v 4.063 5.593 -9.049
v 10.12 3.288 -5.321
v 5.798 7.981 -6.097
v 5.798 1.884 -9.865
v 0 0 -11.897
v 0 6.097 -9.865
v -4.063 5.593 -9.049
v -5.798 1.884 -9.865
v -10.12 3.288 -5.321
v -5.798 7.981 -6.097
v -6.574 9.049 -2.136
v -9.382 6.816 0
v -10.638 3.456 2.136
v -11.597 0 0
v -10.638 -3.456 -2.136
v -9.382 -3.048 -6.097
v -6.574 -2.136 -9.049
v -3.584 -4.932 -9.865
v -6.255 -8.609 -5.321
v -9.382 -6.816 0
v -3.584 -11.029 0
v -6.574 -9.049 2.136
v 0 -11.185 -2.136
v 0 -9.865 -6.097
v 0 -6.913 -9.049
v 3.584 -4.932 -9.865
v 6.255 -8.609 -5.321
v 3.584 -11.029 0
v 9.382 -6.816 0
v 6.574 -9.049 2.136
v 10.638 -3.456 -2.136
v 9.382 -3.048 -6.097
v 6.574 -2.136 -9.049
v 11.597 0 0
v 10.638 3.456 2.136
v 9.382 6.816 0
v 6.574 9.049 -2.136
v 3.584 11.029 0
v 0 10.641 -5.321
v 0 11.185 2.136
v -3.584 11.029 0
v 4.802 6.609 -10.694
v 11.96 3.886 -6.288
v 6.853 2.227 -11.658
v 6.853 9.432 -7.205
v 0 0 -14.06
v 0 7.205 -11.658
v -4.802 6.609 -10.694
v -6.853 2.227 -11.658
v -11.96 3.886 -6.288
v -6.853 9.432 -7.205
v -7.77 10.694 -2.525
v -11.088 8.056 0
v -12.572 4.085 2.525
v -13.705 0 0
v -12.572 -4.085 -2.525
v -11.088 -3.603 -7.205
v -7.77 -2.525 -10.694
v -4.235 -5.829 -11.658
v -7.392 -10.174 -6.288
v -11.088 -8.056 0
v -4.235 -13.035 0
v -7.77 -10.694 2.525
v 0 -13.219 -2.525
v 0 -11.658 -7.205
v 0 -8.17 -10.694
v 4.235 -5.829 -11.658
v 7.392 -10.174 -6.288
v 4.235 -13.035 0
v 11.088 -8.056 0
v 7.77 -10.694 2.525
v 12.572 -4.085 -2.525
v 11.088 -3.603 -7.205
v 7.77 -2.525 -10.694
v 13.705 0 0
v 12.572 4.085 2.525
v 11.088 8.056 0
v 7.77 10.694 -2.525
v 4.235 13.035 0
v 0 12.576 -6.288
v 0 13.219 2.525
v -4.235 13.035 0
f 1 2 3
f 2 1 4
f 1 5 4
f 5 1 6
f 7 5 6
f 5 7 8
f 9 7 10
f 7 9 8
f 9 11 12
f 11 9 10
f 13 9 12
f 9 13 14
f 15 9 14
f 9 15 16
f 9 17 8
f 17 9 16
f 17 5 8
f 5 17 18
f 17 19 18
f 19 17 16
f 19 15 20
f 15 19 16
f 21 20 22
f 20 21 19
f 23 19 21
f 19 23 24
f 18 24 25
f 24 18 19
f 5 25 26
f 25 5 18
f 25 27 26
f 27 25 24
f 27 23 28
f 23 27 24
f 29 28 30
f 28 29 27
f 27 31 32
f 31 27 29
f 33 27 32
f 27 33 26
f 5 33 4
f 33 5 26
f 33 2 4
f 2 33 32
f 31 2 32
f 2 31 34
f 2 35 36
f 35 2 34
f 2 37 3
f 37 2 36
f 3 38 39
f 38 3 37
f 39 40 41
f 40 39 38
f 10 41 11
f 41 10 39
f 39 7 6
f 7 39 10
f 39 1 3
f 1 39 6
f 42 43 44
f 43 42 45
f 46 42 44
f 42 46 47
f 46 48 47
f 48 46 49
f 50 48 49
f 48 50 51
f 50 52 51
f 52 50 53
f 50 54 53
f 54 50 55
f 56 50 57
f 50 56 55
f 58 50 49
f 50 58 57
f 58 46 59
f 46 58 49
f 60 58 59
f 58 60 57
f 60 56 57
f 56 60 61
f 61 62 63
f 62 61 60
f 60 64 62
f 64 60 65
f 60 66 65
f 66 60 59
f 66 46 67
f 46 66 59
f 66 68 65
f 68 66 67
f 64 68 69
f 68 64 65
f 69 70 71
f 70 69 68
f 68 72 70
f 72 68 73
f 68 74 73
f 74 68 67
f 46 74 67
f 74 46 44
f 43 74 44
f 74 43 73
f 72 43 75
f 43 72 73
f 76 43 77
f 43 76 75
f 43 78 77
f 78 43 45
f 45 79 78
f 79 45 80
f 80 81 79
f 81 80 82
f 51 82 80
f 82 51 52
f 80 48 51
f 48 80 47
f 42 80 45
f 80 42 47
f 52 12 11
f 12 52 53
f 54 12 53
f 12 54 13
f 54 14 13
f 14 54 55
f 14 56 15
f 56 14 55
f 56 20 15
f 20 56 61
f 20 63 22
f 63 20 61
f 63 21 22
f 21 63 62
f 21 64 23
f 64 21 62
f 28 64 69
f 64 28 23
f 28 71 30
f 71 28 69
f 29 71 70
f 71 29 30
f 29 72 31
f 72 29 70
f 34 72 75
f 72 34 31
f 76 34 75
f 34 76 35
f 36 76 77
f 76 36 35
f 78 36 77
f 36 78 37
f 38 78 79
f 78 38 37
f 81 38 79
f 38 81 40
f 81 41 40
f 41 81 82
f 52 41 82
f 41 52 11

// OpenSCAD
module eggshell25mm() {

	rotate ([0,0,18])
		polyhedron( points = [ [5.592530e+00, 4.063211e+00, -9.048904e+00], [7.980826e+00, 5.798409e+00, -6.096808e+00], [1.064110e+01, -0.000000e+00, -5.320550e+00], [6.096808e+00, 0.000000e+00, -9.864843e+00], [-8.881784e-16, 0.000000e+00, -1.189711e+01], [1.884017e+00, 5.798409e+00, -9.864843e+00], [-2.136156e+00, 6.574413e+00, -9.048904e+00], [-4.932421e+00, 3.583614e+00, -9.864843e+00], [-8.608831e+00, 6.254682e+00, -5.320550e+00], [-3.048404e+00, 9.382023e+00, -6.096808e+00], [-3.456374e+00, 1.063762e+01, -2.136156e+00], [-6.816439e+00, 9.382023e+00, -0.000000e+00], [-9.048904e+00, 6.574413e+00, 2.136156e+00], [-1.102923e+01, 3.583614e+00, 8.881784e-16], [-1.118506e+01, 0.000000e+00, -2.136156e+00], [-9.864843e+00, 0.000000e+00, -6.096808e+00], [-6.912747e+00, 0.000000e+00, -9.048904e+00], [-4.932421e+00, -3.583614e+00, -9.864843e+00], [-8.608831e+00, -6.254682e+00, -5.320550e+00], [-1.102923e+01, -3.583614e+00, 8.881784e-16], [-9.048904e+00, -6.574413e+00, 2.136156e+00], [-6.816439e+00, -9.382023e+00, -0.000000e+00], [-3.456374e+00, -1.063762e+01, -2.136156e+00], [-3.048404e+00, -9.382023e+00, -6.096808e+00], [-2.136156e+00, -6.574413e+00, -9.048904e+00], [1.884017e+00, -5.798409e+00, -9.864843e+00], [3.288281e+00, -1.012029e+01, -5.320550e+00], [0.000000e+00, -1.159682e+01, -0.000000e+00], [3.456374e+00, -1.063762e+01, 2.136156e+00], [6.816439e+00, -9.382023e+00, -0.000000e+00], [9.048904e+00, -6.574413e+00, -2.136156e+00], [7.980826e+00, -5.798409e+00, -6.096808e+00], [5.592530e+00, -4.063211e+00, -9.048904e+00], [1.102923e+01, -3.583614e+00, -8.881784e-16], [1.118506e+01, -0.000000e+00, 2.136156e+00], [1.102923e+01, 3.583614e+00, -8.881784e-16], [9.048904e+00, 6.574413e+00, -2.136156e+00], [3.288281e+00, 1.012029e+01, -5.320550e+00], [6.816439e+00, 9.382023e+00, -0.000000e+00], [3.456374e+00, 1.063762e+01, 2.136156e+00], [-0.000000e+00, 1.159682e+01, -0.000000e+00], [6.609354e+00, 4.801977e+00, -1.069416e+01], [9.431885e+00, 6.852665e+00, -7.205319e+00], [1.257585e+01, -0.000000e+00, -6.287923e+00], [7.205319e+00, 0.000000e+00, -1.165845e+01], [-8.881784e-16, 0.000000e+00, -1.406022e+01], [2.226566e+00, 6.852665e+00, -1.165845e+01], [-2.524549e+00, 7.769761e+00, -1.069416e+01], [-5.829225e+00, 4.235180e+00, -1.165845e+01], [-1.017407e+01, 7.391897e+00, -6.287923e+00], [-3.602659e+00, 1.108785e+01, -7.205319e+00], [-4.084805e+00, 1.257174e+01, -2.524549e+00], [-8.055791e+00, 1.108785e+01, 4.440892e-16], [-1.069416e+01, 7.769761e+00, 2.524549e+00], [-1.303454e+01, 4.235180e+00, 8.881784e-16], [-1.321871e+01, 0.000000e+00, -2.524549e+00], [-1.165845e+01, 0.000000e+00, -7.205319e+00], [-8.169611e+00, 0.000000e+00, -1.069416e+01], [-5.829225e+00, -4.235180e+00, -1.165845e+01], [-1.017407e+01, -7.391897e+00, -6.287923e+00], [-1.303454e+01, -4.235180e+00, 8.881784e-16], [-1.069416e+01, -7.769761e+00, 2.524549e+00], [-8.055791e+00, -1.108785e+01, 4.440892e-16], [-4.084805e+00, -1.257174e+01, -2.524549e+00], [-3.602659e+00, -1.108785e+01, -7.205319e+00], [-2.524549e+00, -7.769761e+00, -1.069416e+01], [2.226566e+00, -6.852665e+00, -1.165845e+01], [3.886150e+00, -1.196034e+01, -6.287923e+00], [0.000000e+00, -1.370533e+01, -0.000000e+00], [4.084805e+00, -1.257174e+01, 2.524549e+00], [8.055791e+00, -1.108785e+01, -4.440892e-16], [1.069416e+01, -7.769761e+00, -2.524549e+00], [9.431885e+00, -6.852665e+00, -7.205319e+00], [6.609354e+00, -4.801977e+00, -1.069416e+01], [1.303454e+01, -4.235180e+00, -8.881784e-16], [1.321871e+01, -0.000000e+00, 2.524549e+00], [1.303454e+01, 4.235180e+00, -8.881784e-16], [1.069416e+01, 7.769761e+00, -2.524549e+00], [3.886150e+00, 1.196034e+01, -6.287923e+00], [8.055791e+00, 1.108785e+01, -4.440892e-16], [4.084805e+00, 1.257174e+01, 2.524549e+00], [-0.000000e+00, 1.370533e+01, -0.000000e+00] ], faces = [ [ 1, 2, 3, 0 ] , [ 3, 4, 5, 0 ] , [ 5, 4, 7, 6 ] , [ 7, 8, 9, 6 ] , [ 9, 8, 11, 10 ] , [ 11, 8, 13, 12 ] , [ 13, 8, 15, 14 ] , [ 15, 8, 7, 16 ] , [ 7, 4, 17, 16 ] , [ 17, 18, 15, 16 ] , [ 15, 18, 19, 14 ] , [ 19, 18, 21, 20 ] , [ 21, 18, 23, 22 ] , [ 23, 18, 17, 24 ] , [ 17, 4, 25, 24 ] , [ 25, 26, 23, 24 ] , [ 23, 26, 27, 22 ] , [ 27, 26, 29, 28 ] , [ 29, 26, 31, 30 ] , [ 31, 26, 25, 32 ] , [ 25, 4, 3, 32 ] , [ 3, 2, 31, 32 ] , [ 31, 2, 33, 30 ] , [ 33, 2, 35, 34 ] , [ 35, 2, 1, 36 ] , [ 1, 37, 38, 36 ] , [ 38, 37, 40, 39 ] , [ 40, 37, 9, 10 ] , [ 9, 37, 5, 6 ] , [ 5, 37, 1, 0 ] , [ 44, 43, 42, 41 ] , [ 46, 45, 44, 41 ] , [ 48, 45, 46, 47 ] , [ 50, 49, 48, 47 ] , [ 52, 49, 50, 51 ] , [ 54, 49, 52, 53 ] , [ 56, 49, 54, 55 ] , [ 48, 49, 56, 57 ] , [ 58, 45, 48, 57 ] , [ 56, 59, 58, 57 ] , [ 60, 59, 56, 55 ] , [ 62, 59, 60, 61 ] , [ 64, 59, 62, 63 ] , [ 58, 59, 64, 65 ] , [ 66, 45, 58, 65 ] , [ 64, 67, 66, 65 ] , [ 68, 67, 64, 63 ] , [ 70, 67, 68, 69 ] , [ 72, 67, 70, 71 ] , [ 66, 67, 72, 73 ] , [ 44, 45, 66, 73 ] , [ 72, 43, 44, 73 ] , [ 74, 43, 72, 71 ] , [ 76, 43, 74, 75 ] , [ 42, 43, 76, 77 ] , [ 79, 78, 42, 77 ] , [ 81, 78, 79, 80 ] , [ 50, 78, 81, 51 ] , [ 46, 78, 50, 47 ] , [ 42, 78, 46, 41 ] , [ 52, 51, 10, 11 ] , [ 53, 52, 11, 12 ] , [ 54, 53, 12, 13 ] , [ 55, 54, 13, 14 ] , [ 60, 55, 14, 19 ] , [ 61, 60, 19, 20 ] , [ 62, 61, 20, 21 ] , [ 63, 62, 21, 22 ] , [ 68, 63, 22, 27 ] , [ 69, 68, 27, 28 ] , [ 70, 69, 28, 29 ] , [ 71, 70, 29, 30 ] , [ 74, 71, 30, 33 ] , [ 75, 74, 33, 34 ] , [ 76, 75, 34, 35 ] , [ 77, 76, 35, 36 ] , [ 79, 77, 36, 38 ] , [ 80, 79, 38, 39 ] , [ 81, 80, 39, 40 ] , [ 51, 81, 40, 10 ]  ], convexity = 10);

}

eggshell25mm();
